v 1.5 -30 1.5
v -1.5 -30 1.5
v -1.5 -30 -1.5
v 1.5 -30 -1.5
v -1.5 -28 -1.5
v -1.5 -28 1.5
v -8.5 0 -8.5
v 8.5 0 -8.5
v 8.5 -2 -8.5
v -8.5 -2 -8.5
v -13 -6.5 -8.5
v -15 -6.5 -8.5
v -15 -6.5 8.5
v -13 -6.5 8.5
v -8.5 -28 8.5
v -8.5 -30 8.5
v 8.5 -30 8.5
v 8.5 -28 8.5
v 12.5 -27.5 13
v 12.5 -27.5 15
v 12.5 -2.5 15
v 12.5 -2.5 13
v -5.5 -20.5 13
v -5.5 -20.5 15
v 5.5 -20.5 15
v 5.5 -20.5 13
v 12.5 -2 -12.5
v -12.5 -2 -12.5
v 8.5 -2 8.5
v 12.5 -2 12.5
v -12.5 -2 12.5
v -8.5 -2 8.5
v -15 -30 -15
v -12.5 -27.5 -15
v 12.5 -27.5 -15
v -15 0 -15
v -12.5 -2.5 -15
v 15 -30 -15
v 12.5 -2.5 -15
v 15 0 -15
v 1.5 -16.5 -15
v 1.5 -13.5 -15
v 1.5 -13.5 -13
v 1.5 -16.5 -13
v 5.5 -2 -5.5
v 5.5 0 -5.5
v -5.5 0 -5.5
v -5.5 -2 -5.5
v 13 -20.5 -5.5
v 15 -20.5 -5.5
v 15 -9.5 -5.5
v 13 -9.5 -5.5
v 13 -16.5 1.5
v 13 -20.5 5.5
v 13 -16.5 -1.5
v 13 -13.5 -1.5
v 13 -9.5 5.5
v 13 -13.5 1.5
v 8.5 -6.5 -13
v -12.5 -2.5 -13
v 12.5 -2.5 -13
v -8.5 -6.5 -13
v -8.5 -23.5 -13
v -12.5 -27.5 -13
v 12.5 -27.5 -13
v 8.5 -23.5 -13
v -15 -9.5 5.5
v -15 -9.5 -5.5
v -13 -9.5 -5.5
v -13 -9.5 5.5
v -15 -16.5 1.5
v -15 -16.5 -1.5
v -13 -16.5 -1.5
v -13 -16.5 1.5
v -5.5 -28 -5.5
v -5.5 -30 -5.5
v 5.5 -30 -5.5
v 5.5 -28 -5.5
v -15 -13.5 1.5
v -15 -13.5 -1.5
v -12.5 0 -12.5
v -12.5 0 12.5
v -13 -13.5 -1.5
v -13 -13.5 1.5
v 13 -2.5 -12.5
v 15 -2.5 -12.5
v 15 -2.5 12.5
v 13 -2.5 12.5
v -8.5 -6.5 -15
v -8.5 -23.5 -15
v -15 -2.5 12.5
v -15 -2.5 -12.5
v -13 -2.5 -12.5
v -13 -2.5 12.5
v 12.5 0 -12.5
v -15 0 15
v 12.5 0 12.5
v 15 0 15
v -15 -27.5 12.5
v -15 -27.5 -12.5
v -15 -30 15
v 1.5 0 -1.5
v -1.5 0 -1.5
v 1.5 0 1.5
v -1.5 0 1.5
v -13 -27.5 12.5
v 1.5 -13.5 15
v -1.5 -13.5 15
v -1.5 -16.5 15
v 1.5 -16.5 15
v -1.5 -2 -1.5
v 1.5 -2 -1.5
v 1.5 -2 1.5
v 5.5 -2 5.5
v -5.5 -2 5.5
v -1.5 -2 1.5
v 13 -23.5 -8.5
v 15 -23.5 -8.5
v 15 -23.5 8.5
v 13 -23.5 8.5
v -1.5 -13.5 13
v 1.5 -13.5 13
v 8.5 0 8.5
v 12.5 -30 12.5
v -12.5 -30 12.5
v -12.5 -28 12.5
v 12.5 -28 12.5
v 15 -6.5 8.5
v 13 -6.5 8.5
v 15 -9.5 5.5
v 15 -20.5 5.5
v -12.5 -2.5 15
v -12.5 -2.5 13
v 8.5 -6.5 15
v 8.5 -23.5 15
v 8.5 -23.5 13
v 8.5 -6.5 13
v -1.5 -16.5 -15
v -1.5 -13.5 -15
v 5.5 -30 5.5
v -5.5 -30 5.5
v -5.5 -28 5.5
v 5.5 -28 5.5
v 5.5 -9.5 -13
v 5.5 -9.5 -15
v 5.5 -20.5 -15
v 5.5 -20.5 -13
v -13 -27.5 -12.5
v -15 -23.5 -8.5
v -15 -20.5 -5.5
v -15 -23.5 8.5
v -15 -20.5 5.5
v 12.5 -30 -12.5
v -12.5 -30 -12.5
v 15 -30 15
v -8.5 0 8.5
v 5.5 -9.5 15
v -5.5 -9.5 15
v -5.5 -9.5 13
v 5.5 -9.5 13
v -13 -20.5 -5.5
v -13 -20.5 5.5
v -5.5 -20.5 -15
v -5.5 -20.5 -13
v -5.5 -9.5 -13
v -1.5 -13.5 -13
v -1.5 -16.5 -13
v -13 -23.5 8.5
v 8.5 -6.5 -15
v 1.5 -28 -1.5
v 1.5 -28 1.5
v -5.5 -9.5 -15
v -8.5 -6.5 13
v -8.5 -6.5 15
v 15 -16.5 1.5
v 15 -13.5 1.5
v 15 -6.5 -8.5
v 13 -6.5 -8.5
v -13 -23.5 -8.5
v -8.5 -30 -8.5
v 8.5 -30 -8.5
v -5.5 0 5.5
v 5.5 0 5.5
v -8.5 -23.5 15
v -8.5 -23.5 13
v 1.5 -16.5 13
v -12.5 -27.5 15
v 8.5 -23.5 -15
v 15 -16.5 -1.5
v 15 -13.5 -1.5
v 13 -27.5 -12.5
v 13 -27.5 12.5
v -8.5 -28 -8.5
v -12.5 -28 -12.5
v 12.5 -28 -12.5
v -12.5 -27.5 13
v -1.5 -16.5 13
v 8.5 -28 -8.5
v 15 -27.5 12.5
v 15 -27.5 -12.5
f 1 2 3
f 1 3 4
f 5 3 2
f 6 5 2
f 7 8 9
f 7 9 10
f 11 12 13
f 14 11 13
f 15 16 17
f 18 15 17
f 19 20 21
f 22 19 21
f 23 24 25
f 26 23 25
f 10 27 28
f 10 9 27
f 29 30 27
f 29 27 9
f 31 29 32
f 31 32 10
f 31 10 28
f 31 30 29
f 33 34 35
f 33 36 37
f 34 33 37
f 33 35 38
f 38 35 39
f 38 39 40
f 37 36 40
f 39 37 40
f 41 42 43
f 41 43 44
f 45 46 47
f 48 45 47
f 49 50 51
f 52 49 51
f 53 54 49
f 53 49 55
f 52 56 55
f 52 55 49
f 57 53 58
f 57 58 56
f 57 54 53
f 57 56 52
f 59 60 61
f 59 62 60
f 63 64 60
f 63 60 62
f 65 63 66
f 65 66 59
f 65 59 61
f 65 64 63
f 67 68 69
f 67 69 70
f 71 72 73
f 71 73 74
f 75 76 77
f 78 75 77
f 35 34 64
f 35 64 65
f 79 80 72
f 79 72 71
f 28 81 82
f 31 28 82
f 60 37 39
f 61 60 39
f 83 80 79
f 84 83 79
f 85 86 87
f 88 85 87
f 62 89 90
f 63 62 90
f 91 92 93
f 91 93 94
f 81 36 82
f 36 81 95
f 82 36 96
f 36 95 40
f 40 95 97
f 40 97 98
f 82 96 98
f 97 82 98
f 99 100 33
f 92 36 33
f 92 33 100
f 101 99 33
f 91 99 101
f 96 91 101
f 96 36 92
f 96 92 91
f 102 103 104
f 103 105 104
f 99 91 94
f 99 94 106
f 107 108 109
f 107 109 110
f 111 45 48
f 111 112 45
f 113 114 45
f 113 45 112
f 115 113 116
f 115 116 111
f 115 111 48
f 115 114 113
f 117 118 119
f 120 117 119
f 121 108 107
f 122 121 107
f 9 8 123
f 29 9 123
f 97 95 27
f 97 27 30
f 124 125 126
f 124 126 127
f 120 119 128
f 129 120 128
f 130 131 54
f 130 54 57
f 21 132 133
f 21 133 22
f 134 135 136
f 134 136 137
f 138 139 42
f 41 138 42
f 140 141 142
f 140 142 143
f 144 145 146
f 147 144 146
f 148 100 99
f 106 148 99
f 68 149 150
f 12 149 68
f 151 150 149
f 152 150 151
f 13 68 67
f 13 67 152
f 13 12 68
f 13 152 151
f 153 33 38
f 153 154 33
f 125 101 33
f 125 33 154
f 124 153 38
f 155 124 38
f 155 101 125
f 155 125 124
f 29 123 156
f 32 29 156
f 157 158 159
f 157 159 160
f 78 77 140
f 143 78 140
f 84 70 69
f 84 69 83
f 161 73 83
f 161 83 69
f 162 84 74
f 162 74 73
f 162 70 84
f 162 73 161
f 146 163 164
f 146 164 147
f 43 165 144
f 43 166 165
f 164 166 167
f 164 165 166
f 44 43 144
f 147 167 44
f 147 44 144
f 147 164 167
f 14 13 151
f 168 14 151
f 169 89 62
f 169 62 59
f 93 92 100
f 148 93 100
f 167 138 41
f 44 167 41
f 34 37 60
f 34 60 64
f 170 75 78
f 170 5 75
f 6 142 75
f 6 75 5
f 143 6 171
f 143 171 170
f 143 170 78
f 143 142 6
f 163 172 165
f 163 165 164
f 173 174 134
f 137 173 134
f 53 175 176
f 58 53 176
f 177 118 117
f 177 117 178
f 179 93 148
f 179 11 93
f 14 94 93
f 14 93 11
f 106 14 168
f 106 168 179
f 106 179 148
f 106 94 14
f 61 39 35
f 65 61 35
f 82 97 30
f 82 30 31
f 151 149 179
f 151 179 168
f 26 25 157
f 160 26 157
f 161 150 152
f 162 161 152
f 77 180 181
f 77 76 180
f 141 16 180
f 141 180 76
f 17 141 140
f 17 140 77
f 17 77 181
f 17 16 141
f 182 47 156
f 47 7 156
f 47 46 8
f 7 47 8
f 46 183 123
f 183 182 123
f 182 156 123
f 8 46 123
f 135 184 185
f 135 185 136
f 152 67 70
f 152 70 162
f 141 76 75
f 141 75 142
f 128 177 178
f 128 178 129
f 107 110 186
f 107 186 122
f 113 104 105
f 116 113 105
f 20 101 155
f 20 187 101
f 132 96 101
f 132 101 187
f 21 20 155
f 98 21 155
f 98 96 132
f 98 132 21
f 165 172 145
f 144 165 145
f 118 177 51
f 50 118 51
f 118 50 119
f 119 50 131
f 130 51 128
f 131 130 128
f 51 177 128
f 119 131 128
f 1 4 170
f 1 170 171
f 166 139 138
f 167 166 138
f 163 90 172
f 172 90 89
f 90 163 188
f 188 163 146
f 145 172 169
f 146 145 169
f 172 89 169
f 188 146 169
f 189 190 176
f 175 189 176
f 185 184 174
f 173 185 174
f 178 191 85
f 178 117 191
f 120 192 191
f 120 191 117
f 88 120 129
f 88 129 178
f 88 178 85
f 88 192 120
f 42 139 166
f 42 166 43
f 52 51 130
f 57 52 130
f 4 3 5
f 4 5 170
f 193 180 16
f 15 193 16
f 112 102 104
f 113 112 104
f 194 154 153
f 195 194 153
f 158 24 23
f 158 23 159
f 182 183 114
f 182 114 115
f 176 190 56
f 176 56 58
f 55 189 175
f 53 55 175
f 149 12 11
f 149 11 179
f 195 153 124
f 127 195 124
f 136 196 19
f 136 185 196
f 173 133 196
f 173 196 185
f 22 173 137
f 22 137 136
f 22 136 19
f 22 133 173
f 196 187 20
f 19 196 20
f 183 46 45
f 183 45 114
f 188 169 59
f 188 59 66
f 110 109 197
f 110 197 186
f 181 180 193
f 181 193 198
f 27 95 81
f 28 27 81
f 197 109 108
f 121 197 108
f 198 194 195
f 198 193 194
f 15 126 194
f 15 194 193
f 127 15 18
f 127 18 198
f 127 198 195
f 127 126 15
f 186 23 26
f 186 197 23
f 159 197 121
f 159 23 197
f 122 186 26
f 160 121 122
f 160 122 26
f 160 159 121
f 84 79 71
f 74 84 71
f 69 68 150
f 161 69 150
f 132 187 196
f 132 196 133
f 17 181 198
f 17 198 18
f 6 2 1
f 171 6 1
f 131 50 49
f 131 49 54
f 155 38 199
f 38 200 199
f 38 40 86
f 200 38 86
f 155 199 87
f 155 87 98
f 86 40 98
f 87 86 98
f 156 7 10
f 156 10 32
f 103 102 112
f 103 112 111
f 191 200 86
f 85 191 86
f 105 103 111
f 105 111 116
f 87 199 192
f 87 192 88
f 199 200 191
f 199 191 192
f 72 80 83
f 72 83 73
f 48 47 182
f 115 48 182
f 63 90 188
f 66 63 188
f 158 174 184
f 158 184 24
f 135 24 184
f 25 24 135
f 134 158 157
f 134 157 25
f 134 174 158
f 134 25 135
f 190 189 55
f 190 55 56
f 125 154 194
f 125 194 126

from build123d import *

# Parameters (mm, degrees)
F0_W      = 30
F0_H      = 30
F1_DEPTH  = 30
F2_W      = 25
F2_H      = 25
F2_W_2    = 17
F2_H_2    = 17
F2_W_3    = 11
F2_H_3    = 11
F2_W_4    = 3
F2_H_4    = 3
F3_DEPTH  = 2
F4_W      = 25
F4_H      = 25
F4_W_2    = 17
F4_H_2    = 17
F4_W_3    = 11
F4_H_3    = 11
F4_W_4    = 3
F4_H_4    = 3
F5_DEPTH  = 2
F6_W      = 25
F6_H      = 25
F6_W_2    = 17
F6_H_2    = 17
F6_W_3    = 11
F6_H_3    = 11
F6_W_4    = 3
F6_H_4    = 3
F7_DEPTH  = 2
F8_W      = 25
F8_H      = 25
F8_W_2    = 17
F8_H_2    = 17
F8_W_3    = 11
F8_H_3    = 11
F8_W_4    = 3
F8_H_4    = 3
F9_DEPTH  = 2
F10_W     = 25
F10_H     = 25
F10_W_2   = 17
F10_H_2   = 17
F10_W_3   = 11
F10_H_3   = 11
F10_W_4   = 3
F10_H_4   = 3
F11_DEPTH = 2
F12_W     = 25
F12_H     = 25
F12_W_2   = 17
F12_H_2   = 17
F12_W_3   = 11
F12_H_3   = 11
F12_W_4   = 3
F12_H_4   = 3
F13_DEPTH = 2


# Not quite as in the source:
# - a feature names something its author has since deleted; it is built from what else it names


with BuildPart() as f1:
    # F0 (on Front) → F1 (new body)
    with BuildSketch(Plane.XZ):
        Rectangle(F0_W, F0_H)
    extrude(amount=F1_DEPTH)

    # F2 (on face) → F3 (cut)
    with BuildSketch(Plane.XY.offset(15)):
        with Locations((0, -15)):
            Rectangle(F2_W, F2_H)
        with Locations((0, -15)):
            Rectangle(F2_W_2, F2_H_2, mode=Mode.SUBTRACT)
        with Locations((0, -15)):
            Rectangle(F2_W_3, F2_H_3)
        with Locations((0, -15)):
            Rectangle(F2_W_4, F2_H_4, mode=Mode.SUBTRACT)
    extrude(amount=-F3_DEPTH, mode=Mode.SUBTRACT)

    # F4 (on face) → F5 (cut)
    with BuildSketch(Plane(origin=(-15, 0, 0), x_dir=(0, -1, 0), z_dir=(-1, 0, 0))):
        with Locations((15, 0)):
            Rectangle(F4_W, F4_H)
        with Locations((15, 0)):
            Rectangle(F4_W_2, F4_H_2, mode=Mode.SUBTRACT)
        with Locations((15, 0)):
            Rectangle(F4_W_3, F4_H_3)
        with Locations((15, 0)):
            Rectangle(F4_W_4, F4_H_4, mode=Mode.SUBTRACT)
    extrude(amount=-F5_DEPTH, mode=Mode.SUBTRACT)

    # F6 (on face) → F7 (cut)
    with BuildSketch(Plane(origin=(0, 0, -15), x_dir=(1, 0, 0), z_dir=(0, 0, -1))):
        with Locations((0, 15)):
            Rectangle(F6_W, F6_H)
        with Locations((0, 15)):
            Rectangle(F6_W_2, F6_H_2, mode=Mode.SUBTRACT)
        with Locations((0, 15)):
            Rectangle(F6_W_3, F6_H_3)
        with Locations((0, 15)):
            Rectangle(F6_W_4, F6_H_4, mode=Mode.SUBTRACT)
    extrude(amount=-F7_DEPTH, mode=Mode.SUBTRACT)

    # F8 (on face) → F9 (cut)
    with BuildSketch(Plane.XZ.offset(30)):
        Rectangle(F8_W, F8_H)
        Rectangle(F8_W_2, F8_H_2, mode=Mode.SUBTRACT)
        Rectangle(F8_W_3, F8_H_3)
        Rectangle(F8_W_4, F8_H_4, mode=Mode.SUBTRACT)
    extrude(amount=-F9_DEPTH, mode=Mode.SUBTRACT)

    # F10 (on face) → F11 (cut)
    with BuildSketch(Plane(origin=(0, 0, 0), x_dir=(-1, 0, 0), z_dir=(0, 1, 0))):
        Rectangle(F10_W, F10_H)
        Rectangle(F10_W_2, F10_H_2, mode=Mode.SUBTRACT)
        Rectangle(F10_W_3, F10_H_3)
        Rectangle(F10_W_4, F10_H_4, mode=Mode.SUBTRACT)
    extrude(amount=-F11_DEPTH, mode=Mode.SUBTRACT)

    # F12 (on face) → F13 (cut)
    with BuildSketch(Plane.YZ.offset(15)):
        with Locations((-15, 0)):
            Rectangle(F12_W, F12_H)
        with Locations((-15, 0)):
            Rectangle(F12_W_2, F12_H_2, mode=Mode.SUBTRACT)
        with Locations((-15, 0)):
            Rectangle(F12_W_3, F12_H_3)
        with Locations((-15, 0)):
            Rectangle(F12_W_4, F12_H_4, mode=Mode.SUBTRACT)
    extrude(amount=-F13_DEPTH, mode=Mode.SUBTRACT)


solid = f1.part
